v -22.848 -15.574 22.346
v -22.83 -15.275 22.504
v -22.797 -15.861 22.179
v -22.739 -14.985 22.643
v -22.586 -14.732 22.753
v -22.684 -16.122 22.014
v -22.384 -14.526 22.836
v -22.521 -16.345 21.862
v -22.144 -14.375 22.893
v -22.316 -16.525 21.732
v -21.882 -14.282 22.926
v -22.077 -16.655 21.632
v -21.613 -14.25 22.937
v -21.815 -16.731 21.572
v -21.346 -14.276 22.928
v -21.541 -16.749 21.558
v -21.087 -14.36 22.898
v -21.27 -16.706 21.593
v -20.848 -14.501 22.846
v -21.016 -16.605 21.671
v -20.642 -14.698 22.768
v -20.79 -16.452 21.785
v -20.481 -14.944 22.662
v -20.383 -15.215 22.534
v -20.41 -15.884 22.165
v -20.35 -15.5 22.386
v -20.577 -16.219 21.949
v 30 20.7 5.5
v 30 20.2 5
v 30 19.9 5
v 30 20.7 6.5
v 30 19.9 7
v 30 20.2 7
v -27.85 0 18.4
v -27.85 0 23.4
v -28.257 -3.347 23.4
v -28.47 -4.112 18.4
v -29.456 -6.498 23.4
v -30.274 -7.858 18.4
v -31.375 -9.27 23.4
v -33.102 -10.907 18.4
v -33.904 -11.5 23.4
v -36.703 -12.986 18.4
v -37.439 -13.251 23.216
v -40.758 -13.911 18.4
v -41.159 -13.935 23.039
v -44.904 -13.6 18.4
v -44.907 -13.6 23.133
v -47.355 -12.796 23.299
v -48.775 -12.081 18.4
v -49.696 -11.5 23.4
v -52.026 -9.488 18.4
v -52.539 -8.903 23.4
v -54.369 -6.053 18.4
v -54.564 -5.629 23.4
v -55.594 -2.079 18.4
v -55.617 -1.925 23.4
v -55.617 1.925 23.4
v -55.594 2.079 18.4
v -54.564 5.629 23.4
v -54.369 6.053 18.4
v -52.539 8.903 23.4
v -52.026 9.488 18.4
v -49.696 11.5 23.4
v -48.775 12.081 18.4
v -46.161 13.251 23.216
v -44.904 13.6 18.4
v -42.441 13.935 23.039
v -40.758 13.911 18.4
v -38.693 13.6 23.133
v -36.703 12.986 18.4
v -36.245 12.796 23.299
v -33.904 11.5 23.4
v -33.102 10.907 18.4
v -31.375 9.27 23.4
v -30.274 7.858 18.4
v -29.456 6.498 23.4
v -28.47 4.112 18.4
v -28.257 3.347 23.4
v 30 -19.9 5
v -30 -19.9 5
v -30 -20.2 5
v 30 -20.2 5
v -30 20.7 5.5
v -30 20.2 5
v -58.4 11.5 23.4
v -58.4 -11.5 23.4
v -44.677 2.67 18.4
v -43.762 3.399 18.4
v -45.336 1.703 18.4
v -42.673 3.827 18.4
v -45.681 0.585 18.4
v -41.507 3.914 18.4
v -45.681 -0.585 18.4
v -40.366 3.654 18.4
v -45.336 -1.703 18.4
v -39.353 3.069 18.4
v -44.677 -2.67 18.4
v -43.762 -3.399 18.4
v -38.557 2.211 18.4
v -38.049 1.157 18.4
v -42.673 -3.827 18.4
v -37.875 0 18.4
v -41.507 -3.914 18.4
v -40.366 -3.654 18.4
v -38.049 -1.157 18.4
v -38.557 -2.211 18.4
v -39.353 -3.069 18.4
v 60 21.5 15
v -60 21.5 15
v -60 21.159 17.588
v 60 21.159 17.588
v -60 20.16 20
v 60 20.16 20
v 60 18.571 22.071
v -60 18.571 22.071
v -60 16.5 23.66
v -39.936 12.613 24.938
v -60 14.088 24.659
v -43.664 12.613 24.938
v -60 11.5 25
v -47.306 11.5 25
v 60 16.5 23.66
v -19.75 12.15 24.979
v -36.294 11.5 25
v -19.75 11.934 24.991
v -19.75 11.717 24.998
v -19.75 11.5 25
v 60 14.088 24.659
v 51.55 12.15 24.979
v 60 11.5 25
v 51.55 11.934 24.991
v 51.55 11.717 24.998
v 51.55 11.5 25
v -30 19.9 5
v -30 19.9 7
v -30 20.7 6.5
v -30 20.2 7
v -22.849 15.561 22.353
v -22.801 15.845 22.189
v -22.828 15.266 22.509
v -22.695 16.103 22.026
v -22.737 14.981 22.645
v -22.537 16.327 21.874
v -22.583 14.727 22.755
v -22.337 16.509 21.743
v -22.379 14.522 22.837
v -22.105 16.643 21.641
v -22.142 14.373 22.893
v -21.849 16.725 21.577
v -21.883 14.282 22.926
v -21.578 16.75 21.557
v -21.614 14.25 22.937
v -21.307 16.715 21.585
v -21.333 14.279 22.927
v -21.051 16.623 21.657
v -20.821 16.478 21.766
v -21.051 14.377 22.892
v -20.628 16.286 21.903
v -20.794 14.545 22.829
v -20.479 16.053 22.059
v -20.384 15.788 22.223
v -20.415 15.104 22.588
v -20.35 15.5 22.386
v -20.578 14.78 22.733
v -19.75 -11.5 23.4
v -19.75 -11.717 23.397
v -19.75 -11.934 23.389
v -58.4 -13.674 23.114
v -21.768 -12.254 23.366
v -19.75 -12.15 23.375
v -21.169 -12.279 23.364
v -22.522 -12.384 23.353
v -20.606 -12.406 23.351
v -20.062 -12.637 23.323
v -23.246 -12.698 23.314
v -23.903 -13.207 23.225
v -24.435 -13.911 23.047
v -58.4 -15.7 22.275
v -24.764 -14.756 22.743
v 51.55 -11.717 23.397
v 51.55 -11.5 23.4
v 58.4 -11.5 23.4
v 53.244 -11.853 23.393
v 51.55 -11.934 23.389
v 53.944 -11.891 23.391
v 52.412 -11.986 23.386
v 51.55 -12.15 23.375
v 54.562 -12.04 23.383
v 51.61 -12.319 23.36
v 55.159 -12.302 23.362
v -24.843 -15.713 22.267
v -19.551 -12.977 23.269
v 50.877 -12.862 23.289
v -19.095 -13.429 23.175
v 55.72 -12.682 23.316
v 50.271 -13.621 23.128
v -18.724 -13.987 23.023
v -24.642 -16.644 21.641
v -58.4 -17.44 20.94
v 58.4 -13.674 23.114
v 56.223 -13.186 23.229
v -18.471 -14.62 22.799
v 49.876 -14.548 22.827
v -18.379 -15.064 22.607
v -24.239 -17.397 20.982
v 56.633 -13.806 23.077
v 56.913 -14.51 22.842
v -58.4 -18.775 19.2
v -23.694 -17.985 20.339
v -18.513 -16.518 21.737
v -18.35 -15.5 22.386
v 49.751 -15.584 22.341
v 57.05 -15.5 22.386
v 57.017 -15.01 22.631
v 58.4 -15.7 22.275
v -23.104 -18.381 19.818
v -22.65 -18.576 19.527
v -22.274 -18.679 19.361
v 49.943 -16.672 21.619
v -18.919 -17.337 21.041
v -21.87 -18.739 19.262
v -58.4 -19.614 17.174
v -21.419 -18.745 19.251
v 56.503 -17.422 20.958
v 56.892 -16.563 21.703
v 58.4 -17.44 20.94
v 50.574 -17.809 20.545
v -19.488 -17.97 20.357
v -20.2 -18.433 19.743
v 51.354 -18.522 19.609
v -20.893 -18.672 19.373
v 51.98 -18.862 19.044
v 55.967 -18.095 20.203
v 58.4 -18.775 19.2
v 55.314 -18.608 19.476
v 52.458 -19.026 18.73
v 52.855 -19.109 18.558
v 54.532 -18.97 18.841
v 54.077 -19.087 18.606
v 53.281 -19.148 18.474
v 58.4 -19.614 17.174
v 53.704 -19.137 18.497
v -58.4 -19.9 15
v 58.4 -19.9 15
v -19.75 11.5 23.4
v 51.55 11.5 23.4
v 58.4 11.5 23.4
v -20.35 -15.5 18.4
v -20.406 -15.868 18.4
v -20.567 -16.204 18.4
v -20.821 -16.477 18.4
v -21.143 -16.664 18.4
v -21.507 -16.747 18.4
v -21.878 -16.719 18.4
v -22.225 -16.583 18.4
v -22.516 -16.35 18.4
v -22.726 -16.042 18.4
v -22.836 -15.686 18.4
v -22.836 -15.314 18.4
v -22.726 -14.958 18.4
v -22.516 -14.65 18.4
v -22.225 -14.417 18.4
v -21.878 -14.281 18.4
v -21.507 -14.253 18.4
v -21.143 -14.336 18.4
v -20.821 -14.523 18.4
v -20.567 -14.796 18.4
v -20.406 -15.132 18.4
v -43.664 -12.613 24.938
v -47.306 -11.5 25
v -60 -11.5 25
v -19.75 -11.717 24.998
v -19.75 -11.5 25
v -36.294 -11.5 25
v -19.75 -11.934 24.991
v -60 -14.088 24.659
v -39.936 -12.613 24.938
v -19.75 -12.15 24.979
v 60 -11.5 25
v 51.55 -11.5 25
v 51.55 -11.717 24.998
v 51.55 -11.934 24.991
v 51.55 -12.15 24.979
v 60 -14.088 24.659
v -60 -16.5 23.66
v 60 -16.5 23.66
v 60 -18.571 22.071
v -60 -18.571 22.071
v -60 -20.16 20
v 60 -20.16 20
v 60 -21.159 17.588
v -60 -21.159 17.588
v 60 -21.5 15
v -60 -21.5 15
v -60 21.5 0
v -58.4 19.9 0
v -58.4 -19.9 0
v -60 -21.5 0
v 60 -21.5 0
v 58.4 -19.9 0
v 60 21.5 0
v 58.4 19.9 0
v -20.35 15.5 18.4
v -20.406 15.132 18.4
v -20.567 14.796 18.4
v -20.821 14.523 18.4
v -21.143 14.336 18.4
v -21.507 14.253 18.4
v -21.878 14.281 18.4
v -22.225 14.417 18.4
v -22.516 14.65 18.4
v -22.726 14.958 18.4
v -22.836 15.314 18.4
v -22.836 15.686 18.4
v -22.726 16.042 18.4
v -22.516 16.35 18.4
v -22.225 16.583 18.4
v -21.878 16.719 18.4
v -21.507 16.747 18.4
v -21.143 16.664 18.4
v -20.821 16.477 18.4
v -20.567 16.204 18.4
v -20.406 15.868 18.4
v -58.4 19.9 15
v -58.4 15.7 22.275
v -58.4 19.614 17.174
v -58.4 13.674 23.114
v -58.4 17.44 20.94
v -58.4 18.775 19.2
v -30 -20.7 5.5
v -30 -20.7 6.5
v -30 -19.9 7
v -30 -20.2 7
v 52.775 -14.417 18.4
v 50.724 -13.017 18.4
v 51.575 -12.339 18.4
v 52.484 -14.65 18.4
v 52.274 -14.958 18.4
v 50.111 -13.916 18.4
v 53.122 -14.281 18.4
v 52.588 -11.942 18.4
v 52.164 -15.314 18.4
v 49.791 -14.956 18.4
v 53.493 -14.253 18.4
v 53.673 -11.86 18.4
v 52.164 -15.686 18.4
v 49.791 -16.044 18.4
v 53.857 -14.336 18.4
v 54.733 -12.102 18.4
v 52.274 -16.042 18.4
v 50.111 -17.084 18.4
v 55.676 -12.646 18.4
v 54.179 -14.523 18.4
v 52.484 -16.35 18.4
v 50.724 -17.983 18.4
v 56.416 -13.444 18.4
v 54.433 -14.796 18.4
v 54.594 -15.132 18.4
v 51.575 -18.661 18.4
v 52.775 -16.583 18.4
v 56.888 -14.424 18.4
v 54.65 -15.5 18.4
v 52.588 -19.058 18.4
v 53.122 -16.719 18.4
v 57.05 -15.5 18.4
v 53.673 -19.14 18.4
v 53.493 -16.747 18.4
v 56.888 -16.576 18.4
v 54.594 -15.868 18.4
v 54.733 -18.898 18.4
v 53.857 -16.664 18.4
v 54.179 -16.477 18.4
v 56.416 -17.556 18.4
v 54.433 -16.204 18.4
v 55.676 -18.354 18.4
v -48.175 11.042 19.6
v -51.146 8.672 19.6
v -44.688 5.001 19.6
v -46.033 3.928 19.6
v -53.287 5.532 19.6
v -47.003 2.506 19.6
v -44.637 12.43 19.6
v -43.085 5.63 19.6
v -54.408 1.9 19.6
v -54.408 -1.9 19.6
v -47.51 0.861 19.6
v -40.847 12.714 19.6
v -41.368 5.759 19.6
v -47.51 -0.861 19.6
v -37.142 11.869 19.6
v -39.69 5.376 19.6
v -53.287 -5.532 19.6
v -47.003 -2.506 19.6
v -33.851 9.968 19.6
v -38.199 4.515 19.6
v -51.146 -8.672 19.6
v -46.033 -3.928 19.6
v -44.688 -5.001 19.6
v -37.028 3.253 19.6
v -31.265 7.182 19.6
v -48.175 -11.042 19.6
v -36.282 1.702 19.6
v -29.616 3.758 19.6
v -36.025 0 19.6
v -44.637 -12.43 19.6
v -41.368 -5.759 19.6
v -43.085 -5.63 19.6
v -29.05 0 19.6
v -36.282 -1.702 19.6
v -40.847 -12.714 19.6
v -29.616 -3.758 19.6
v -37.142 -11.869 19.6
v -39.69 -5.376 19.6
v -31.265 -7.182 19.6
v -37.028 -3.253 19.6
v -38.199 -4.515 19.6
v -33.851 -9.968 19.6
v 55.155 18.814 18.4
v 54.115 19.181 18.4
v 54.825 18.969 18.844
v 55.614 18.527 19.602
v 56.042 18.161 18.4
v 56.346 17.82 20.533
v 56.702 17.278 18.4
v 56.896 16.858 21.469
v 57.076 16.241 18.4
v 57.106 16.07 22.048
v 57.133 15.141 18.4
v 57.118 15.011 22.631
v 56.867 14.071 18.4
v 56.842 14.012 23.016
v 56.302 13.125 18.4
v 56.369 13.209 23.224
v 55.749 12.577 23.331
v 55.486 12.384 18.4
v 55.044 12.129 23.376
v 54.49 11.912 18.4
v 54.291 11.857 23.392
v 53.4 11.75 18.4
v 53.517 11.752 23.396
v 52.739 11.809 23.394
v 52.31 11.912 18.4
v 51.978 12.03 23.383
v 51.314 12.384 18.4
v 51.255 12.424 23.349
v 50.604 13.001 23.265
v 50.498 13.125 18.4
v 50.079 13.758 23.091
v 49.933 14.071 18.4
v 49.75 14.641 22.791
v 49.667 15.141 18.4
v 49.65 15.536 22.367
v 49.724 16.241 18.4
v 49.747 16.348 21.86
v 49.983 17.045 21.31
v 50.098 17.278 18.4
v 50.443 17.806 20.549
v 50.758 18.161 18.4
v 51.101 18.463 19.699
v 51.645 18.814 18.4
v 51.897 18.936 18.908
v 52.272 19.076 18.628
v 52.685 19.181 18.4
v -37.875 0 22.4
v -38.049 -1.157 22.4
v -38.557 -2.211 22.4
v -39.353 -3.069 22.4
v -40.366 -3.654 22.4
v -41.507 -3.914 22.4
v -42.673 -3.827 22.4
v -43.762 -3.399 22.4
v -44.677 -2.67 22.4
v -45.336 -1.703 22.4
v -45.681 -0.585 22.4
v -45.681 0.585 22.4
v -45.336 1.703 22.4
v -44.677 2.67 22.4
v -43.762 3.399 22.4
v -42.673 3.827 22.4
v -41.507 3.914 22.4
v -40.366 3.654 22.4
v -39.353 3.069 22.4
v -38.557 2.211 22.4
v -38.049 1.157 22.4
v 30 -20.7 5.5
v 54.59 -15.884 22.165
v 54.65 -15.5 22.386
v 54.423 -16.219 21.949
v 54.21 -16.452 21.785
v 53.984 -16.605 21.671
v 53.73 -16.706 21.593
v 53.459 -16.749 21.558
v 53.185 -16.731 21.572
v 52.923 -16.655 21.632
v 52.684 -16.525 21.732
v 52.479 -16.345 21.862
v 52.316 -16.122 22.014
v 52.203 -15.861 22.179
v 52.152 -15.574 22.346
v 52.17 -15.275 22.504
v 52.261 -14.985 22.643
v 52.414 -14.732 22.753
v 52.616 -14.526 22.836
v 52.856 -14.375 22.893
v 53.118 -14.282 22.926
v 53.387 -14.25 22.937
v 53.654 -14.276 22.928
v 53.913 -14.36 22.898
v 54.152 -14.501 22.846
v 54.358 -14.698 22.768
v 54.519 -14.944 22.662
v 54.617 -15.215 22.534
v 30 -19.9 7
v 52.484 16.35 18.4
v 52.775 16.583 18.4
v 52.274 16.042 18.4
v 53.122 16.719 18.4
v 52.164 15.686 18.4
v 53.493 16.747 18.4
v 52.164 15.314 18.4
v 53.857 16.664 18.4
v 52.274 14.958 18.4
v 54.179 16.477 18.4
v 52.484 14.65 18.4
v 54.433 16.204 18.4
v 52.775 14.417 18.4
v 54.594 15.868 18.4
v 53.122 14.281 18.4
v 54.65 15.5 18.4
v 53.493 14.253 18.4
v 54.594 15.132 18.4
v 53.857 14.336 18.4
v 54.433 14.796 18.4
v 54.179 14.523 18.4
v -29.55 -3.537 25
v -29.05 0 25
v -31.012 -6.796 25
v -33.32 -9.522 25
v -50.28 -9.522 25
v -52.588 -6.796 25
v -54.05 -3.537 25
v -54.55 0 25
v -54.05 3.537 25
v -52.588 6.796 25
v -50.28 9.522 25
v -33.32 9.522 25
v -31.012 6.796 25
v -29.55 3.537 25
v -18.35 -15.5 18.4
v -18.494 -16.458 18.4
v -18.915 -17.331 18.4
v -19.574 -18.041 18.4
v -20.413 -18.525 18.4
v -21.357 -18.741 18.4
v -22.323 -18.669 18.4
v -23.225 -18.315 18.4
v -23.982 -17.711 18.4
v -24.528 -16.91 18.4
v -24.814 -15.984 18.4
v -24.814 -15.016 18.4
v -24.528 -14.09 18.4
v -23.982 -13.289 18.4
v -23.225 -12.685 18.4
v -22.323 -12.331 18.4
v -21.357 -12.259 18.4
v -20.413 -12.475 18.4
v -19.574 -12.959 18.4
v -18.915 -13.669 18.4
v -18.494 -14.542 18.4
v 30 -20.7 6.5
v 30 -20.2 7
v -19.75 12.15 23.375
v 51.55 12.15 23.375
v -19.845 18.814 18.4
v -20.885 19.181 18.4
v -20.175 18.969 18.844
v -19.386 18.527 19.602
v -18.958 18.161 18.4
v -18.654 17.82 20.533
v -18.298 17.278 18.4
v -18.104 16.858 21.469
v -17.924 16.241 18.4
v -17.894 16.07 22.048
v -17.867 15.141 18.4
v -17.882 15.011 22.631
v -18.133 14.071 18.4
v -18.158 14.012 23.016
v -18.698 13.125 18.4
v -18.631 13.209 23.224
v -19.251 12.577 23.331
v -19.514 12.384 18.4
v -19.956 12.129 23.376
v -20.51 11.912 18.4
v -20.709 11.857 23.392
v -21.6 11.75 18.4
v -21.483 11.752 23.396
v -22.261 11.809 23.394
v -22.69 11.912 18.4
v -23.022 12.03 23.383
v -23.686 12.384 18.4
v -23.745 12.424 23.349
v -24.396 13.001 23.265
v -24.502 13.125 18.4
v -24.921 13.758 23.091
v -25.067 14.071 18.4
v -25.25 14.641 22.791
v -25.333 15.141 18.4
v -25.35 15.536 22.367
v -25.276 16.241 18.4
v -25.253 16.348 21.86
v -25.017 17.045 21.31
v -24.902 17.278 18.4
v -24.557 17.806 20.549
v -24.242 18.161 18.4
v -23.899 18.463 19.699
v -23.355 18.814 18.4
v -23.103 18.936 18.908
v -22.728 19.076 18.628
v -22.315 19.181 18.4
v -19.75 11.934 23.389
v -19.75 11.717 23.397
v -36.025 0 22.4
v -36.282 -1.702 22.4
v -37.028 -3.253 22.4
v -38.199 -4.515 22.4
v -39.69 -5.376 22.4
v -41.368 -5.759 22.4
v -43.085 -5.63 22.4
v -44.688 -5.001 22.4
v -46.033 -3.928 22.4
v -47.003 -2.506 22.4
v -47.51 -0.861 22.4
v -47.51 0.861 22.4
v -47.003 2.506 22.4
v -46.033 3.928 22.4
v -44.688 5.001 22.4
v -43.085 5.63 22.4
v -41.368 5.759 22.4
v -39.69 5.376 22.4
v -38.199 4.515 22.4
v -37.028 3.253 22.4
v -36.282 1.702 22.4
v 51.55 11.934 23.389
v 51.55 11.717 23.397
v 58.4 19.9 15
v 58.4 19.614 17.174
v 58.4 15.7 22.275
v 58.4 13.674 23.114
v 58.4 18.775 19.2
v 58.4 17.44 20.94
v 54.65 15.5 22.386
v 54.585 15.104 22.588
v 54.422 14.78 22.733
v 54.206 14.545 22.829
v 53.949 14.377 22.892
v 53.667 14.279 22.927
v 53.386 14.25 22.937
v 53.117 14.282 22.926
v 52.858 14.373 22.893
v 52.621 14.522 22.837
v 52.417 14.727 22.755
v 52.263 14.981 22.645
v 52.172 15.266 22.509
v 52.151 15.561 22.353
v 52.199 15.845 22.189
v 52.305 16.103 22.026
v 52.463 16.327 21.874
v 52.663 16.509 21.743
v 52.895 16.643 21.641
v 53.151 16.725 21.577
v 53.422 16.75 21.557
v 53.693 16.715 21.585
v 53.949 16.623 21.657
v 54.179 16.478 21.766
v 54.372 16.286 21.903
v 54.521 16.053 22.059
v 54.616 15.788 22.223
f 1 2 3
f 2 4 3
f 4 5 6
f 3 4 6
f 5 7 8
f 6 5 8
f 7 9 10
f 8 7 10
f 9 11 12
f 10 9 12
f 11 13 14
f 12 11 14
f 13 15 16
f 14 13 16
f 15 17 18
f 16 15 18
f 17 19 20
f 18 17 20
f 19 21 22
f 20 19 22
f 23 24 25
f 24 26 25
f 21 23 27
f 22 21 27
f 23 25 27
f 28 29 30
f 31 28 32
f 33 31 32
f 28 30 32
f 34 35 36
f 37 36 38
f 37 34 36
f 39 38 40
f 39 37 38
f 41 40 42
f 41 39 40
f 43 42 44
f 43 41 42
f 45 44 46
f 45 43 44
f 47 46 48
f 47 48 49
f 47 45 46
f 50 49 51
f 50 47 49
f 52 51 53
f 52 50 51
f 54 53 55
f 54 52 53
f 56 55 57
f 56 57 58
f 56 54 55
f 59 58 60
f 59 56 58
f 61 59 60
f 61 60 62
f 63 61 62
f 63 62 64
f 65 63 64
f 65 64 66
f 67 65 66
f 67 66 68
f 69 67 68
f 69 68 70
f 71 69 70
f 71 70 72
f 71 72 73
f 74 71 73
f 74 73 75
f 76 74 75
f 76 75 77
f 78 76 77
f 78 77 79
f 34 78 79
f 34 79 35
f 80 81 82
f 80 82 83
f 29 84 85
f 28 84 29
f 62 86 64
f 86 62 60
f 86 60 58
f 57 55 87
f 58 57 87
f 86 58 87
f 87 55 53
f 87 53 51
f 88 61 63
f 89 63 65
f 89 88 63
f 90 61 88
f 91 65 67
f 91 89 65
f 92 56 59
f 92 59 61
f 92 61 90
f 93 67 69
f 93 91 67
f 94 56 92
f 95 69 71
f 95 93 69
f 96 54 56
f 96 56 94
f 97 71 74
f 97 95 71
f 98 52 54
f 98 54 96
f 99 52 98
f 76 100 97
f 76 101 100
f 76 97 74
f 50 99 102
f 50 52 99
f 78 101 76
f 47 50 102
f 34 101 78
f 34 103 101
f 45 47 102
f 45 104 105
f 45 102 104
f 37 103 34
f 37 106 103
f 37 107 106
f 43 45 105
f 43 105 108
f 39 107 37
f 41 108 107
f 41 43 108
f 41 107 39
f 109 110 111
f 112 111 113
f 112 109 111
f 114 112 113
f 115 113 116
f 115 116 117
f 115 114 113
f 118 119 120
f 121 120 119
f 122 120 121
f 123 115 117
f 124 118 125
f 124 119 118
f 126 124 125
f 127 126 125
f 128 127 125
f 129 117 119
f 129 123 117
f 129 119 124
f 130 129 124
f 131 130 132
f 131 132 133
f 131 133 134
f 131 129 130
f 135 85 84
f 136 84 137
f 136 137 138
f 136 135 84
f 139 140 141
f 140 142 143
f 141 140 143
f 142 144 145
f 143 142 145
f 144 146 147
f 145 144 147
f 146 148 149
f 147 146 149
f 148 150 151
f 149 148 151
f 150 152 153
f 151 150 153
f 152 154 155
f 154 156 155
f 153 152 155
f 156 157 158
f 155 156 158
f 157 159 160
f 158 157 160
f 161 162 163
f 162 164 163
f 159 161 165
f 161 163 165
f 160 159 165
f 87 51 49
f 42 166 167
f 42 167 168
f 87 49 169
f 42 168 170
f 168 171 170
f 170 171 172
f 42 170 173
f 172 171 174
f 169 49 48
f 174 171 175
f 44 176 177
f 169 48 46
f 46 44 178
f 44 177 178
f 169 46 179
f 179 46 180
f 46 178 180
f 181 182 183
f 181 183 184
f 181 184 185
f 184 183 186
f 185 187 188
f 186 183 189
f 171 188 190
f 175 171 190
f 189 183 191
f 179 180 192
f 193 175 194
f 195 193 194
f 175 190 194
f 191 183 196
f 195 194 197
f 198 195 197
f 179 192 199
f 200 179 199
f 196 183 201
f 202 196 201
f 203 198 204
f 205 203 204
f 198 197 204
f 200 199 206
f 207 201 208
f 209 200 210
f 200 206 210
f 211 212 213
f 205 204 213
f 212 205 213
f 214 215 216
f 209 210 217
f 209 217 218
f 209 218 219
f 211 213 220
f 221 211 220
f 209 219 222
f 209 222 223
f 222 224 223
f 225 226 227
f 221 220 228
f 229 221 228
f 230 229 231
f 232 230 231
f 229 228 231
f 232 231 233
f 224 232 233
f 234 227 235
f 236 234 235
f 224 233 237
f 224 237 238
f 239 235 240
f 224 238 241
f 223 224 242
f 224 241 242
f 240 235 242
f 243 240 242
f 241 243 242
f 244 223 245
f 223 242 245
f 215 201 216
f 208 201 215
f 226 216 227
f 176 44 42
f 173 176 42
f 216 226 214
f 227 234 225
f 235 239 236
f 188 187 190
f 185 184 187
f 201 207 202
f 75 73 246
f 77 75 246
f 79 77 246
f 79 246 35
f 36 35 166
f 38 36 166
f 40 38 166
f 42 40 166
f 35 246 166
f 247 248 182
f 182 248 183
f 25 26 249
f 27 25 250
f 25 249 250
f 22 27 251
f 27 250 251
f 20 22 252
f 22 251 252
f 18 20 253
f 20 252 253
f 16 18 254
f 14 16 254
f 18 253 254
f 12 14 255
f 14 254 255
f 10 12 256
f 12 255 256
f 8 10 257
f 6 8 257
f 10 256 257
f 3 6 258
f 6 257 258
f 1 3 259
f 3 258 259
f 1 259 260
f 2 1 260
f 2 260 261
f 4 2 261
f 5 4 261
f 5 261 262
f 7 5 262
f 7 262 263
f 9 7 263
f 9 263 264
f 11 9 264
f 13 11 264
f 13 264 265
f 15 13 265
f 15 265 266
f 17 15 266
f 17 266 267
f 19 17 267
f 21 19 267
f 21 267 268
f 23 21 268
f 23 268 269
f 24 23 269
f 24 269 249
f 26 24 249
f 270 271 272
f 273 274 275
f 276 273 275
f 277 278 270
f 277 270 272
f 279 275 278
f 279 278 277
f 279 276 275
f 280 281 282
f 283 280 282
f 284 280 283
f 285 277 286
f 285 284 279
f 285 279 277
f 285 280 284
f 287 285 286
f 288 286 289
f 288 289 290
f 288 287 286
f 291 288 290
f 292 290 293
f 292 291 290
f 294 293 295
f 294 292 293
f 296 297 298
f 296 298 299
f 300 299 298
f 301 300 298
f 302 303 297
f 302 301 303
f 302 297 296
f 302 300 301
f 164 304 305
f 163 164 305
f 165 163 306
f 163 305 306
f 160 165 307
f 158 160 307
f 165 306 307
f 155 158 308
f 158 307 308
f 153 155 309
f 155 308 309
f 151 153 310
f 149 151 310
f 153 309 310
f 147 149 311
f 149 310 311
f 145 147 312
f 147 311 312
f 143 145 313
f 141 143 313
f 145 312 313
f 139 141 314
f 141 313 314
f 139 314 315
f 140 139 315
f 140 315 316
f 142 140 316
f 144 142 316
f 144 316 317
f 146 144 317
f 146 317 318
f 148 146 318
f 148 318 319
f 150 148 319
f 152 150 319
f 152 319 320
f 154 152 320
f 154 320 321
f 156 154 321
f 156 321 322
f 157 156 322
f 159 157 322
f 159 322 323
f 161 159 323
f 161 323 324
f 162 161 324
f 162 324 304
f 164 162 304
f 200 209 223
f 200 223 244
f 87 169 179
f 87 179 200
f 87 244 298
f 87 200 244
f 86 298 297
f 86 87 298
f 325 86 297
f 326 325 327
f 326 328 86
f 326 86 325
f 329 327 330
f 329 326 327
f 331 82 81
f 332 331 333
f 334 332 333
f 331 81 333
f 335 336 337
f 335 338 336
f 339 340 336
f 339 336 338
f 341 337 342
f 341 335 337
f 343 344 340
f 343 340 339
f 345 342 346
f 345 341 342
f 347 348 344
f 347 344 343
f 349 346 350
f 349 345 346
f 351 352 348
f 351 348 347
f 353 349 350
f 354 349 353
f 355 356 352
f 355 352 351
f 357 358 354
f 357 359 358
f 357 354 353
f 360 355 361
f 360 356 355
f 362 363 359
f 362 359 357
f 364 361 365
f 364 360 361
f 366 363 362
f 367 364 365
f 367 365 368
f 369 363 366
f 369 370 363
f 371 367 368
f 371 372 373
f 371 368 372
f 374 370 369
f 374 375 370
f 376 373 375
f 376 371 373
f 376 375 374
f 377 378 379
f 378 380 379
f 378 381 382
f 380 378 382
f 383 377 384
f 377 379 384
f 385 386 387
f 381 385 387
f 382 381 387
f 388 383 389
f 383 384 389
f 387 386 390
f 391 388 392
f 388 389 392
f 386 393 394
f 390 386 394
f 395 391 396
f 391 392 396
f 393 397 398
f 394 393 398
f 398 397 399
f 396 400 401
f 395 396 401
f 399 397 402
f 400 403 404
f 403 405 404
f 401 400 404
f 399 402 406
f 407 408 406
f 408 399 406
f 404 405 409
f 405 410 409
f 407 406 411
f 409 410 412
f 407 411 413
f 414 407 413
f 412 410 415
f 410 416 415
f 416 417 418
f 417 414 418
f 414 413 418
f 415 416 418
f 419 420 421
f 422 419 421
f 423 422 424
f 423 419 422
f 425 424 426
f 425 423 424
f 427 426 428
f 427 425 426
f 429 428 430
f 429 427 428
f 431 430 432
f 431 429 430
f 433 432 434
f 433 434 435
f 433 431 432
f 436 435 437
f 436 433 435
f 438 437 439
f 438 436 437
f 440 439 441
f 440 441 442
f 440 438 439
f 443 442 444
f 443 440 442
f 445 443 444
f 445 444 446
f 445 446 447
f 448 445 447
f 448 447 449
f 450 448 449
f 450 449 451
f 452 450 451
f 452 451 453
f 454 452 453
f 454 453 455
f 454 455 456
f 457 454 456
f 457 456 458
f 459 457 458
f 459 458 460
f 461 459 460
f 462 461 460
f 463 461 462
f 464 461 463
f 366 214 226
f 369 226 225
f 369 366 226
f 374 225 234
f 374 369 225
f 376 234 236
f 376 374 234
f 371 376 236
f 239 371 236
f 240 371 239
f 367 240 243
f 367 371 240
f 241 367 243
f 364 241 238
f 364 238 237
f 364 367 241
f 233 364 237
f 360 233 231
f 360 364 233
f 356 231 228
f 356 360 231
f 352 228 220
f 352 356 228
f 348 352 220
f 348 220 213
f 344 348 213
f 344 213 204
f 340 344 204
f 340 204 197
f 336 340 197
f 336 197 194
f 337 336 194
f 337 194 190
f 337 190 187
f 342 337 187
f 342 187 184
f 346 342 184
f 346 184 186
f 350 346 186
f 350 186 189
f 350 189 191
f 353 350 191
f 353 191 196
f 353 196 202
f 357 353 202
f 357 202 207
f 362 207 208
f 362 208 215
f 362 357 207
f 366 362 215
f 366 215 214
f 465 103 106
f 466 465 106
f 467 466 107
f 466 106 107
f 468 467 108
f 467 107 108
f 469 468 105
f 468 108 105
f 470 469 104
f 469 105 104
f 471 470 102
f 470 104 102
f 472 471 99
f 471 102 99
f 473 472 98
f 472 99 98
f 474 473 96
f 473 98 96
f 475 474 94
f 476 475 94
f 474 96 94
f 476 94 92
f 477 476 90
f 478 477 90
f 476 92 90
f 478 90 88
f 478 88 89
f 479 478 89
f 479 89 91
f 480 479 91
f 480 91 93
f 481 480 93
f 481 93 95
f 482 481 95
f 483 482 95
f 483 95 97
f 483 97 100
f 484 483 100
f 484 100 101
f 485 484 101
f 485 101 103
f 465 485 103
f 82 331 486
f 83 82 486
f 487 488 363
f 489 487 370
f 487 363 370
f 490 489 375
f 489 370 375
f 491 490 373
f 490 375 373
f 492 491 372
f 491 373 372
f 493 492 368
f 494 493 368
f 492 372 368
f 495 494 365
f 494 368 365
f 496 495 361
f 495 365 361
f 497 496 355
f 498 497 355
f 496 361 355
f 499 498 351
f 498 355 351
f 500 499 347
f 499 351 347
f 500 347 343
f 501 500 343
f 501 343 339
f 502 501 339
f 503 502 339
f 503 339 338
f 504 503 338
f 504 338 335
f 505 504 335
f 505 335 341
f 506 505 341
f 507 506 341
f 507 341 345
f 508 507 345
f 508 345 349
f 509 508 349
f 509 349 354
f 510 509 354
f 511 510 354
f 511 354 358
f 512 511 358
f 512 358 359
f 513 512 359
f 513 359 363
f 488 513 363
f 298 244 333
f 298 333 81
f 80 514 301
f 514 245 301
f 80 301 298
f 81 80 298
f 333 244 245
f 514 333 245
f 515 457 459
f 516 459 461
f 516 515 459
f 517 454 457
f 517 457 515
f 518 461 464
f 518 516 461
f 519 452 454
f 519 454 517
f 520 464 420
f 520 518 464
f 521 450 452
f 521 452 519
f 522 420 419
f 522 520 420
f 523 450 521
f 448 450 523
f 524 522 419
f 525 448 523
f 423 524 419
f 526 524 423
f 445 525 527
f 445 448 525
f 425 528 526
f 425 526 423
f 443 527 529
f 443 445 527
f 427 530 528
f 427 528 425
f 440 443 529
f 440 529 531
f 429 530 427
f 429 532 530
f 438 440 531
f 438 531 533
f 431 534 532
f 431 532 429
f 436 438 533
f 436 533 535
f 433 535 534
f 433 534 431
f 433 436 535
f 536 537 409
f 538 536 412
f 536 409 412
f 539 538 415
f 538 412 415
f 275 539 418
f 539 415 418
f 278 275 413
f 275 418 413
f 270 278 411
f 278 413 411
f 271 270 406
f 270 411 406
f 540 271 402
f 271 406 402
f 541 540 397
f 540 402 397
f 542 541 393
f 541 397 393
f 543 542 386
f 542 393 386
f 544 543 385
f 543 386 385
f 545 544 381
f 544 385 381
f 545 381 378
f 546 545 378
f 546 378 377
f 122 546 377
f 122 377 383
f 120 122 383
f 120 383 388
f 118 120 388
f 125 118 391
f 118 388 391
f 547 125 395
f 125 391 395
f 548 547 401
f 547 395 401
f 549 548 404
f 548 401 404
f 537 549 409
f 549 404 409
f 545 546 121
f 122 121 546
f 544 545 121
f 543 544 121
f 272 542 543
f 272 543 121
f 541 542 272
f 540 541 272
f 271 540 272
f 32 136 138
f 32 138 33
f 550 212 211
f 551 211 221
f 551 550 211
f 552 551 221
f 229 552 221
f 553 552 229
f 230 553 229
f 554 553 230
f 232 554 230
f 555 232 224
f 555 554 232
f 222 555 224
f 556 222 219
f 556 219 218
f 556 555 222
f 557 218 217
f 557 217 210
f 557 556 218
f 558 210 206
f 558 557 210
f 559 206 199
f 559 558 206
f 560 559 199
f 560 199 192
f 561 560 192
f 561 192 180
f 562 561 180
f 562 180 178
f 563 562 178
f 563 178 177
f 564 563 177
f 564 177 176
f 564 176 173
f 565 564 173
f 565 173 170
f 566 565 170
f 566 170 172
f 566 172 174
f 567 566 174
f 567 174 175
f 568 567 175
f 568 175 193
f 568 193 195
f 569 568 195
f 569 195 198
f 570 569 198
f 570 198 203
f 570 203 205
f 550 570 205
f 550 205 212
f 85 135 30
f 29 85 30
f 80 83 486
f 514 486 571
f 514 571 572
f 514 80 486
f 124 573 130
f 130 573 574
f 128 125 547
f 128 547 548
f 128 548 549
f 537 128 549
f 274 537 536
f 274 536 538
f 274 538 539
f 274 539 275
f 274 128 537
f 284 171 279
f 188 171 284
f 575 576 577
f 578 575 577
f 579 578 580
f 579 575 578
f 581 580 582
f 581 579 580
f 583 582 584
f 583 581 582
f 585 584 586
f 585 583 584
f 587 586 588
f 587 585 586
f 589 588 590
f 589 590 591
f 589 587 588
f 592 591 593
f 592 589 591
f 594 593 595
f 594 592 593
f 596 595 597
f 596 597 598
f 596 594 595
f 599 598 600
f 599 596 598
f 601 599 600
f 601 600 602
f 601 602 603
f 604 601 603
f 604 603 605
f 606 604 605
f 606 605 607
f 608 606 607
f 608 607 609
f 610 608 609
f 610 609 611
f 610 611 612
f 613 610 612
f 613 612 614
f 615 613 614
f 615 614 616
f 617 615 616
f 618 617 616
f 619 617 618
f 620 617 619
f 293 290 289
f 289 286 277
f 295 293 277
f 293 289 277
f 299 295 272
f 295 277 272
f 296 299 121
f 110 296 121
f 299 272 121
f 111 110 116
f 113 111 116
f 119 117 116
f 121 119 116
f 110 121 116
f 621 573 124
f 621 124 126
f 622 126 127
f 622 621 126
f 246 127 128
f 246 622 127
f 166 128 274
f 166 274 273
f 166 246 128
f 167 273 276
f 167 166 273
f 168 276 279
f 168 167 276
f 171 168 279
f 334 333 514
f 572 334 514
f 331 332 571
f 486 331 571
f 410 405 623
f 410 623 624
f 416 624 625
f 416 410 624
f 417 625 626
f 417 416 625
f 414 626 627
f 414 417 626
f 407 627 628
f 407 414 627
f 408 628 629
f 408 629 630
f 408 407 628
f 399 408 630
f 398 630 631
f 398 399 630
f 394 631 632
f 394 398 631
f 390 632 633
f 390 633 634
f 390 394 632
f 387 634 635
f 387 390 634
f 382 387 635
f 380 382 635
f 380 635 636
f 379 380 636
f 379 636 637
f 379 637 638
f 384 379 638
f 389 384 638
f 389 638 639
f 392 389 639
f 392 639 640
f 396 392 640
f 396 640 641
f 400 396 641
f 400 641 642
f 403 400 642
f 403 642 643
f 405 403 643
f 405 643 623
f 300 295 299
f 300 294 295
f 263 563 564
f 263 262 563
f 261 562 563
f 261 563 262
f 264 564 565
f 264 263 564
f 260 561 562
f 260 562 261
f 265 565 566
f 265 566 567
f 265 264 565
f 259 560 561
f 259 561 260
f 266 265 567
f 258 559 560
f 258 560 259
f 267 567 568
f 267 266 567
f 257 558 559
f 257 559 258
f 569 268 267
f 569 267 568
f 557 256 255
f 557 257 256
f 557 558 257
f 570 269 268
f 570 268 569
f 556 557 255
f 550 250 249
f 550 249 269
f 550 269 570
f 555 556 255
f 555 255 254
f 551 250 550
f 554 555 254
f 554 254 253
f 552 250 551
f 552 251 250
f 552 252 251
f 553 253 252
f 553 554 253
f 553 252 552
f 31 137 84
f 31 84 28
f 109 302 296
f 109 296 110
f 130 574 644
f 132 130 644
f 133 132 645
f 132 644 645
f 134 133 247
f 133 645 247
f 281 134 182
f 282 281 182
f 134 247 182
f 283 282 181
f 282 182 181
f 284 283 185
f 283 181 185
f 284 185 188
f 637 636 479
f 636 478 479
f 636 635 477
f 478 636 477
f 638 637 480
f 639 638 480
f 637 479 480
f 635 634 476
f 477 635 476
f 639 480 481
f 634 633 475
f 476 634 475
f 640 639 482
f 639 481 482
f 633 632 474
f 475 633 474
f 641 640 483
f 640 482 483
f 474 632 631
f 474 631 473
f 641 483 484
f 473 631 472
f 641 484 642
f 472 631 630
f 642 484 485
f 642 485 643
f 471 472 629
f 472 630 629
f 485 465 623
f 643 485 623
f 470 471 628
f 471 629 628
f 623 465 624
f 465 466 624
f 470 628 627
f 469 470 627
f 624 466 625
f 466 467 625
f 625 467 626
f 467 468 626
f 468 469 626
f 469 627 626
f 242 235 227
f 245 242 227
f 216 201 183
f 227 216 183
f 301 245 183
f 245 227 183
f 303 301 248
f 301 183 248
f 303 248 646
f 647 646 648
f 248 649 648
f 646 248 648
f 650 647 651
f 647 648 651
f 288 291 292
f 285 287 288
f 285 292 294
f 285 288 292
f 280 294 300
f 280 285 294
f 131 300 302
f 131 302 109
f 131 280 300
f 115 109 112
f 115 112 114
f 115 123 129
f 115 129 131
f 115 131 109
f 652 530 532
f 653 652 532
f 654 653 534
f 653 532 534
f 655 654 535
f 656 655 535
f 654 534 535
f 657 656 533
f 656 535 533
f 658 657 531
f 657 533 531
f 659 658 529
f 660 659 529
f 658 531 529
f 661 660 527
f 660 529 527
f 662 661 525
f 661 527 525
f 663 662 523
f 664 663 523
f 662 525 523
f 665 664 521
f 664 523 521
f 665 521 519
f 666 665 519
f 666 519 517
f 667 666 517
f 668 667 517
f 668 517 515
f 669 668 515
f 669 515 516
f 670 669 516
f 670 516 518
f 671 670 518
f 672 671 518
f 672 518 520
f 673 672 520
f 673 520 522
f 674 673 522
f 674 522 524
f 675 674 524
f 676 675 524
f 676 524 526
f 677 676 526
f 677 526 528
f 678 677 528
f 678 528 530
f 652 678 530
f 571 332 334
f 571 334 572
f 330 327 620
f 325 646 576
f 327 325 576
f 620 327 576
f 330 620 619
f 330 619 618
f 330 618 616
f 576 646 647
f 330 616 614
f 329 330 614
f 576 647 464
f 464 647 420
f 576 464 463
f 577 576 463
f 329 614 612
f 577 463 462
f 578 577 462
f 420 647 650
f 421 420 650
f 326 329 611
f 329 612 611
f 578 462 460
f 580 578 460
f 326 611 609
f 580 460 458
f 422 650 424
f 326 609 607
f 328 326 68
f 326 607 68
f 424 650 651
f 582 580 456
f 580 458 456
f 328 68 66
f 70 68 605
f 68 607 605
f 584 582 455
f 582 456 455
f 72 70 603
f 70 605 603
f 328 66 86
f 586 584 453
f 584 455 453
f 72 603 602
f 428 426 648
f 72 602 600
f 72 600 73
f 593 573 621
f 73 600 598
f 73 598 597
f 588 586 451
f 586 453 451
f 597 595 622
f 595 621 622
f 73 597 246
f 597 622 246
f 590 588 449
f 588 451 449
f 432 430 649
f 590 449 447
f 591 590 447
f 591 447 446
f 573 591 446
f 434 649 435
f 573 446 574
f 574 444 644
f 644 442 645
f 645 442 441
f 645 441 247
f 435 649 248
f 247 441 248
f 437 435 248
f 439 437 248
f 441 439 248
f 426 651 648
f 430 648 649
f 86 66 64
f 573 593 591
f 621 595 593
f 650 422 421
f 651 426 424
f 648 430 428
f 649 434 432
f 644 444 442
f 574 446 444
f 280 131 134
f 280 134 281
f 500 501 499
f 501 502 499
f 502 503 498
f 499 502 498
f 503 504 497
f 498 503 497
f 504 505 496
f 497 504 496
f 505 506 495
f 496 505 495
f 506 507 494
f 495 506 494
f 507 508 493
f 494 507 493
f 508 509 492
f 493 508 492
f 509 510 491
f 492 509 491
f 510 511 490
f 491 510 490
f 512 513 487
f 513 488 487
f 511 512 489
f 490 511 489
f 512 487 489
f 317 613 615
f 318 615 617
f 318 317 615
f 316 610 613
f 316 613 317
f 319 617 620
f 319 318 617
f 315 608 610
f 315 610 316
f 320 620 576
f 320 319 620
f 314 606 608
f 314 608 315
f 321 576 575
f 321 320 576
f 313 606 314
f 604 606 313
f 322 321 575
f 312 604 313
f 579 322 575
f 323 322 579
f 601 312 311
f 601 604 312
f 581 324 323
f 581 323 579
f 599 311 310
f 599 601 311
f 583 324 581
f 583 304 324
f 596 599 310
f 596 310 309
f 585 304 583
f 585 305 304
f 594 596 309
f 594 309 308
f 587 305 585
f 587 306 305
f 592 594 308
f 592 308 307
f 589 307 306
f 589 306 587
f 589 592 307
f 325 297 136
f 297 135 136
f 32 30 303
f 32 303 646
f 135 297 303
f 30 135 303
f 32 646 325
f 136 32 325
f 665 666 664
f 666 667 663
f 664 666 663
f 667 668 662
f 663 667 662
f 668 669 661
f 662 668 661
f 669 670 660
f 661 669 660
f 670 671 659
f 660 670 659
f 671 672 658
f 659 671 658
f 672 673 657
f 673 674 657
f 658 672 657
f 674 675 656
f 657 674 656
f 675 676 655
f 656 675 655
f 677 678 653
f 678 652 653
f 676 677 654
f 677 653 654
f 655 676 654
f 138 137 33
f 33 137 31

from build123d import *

# Parameters (mm, degrees)
F1_DEPTH  = 60
F2_T      = -1.6
F4_R      = 3.75
F4_R_2    = 1.25
F4_R_3    = 3.65
F4_R_4    = 3.25
F4_R_5    = 12.75
F4_W      = 71.3
F4_H      = 24.3
F6_DEPTH  = 6.601
F4_R_6    = 13.95
F7_DEPTH  = 1.2
F8_R      = 3.925
F9_DEPTH  = 6.6010001
F8_R_2    = 5.775
F10_DEPTH = 4
F11_DEPTH = 5
F12_W     = 60
F12_H     = 2
F13_DEPTH = 0.8
F14_SIZE  = 0.5


with BuildPart() as f1:
    # F0 (on Right) → F1 (new body, symmetric)
    with BuildSketch(Plane.YZ):
        with BuildLine():
            Line((-21.5, 15), (-21.5, 0))
            Line((-21.5, 0), (21.5, 0))
            Line((21.5, 0), (21.5, 15))
            ThreePointArc((21.5, 15), (18.5710678119, 22.0710678119), (11.5, 25))
            Line((11.5, 25), (-11.5, 25))
            ThreePointArc((-11.5, 25), (-18.5710678119, 22.0710678119), (-21.5, 15))
        make_face()
    extrude(amount=F1_DEPTH, both=True)

    # F2
    f2_openings = [f1.faces().sort_by_distance(p)[0] for p in [
        (0, 0, 0),
    ]]
    offset(amount=F2_T, openings=f2_openings)

    # F4 (on offset) → F5 (join, up to the next surface of F1)
    with BuildSketch(Plane(origin=(0, 0, 18.4), x_dir=(1, 0, 0), z_dir=(0, 0, -1))):
        with Locations((53.4, -15.5)):
            Circle(F4_R)
        with Locations((53.4, -15.5)):
            Circle(F4_R_2, mode=Mode.SUBTRACT)
        with Locations((53.4, 15.5)):
            Circle(F4_R_3)
        with Locations((53.4, 15.5)):
            Circle(F4_R_2, mode=Mode.SUBTRACT)
        with Locations((-21.6, -15.5)):
            Circle(F4_R)
        with Locations((-21.6, -15.5)):
            Circle(F4_R_2, mode=Mode.SUBTRACT)
        with Locations((-21.6, 15.5)):
            Circle(F4_R_4)
        with Locations((-21.6, 15.5)):
            Circle(F4_R_2, mode=Mode.SUBTRACT)
    extrude(until=Until.NEXT, dir=(0, 0, 1))

    # F4 (on offset) → F6 (cut, through all)
    with BuildSketch(Plane(origin=(0, 0, 18.4), x_dir=(1, 0, 0), z_dir=(0, 0, -1))):
        with Locations((-41.8, 0)):
            Circle(F4_R_5)
        with Locations((15.9, 0)):
            Rectangle(F4_W, F4_H)
    extrude(amount=-F6_DEPTH, mode=Mode.SUBTRACT)



with BuildPart() as f7:
    # F4 (on offset) → F7 (new body)
    with BuildSketch(Plane(origin=(0, 0, 18.4), x_dir=(1, 0, 0), z_dir=(0, 0, -1))):
        with Locations((-41.8, 0)):
            Circle(F4_R_6)
        with Locations((-41.8, 0)):
            Circle(F4_R_5, mode=Mode.SUBTRACT)
        with Locations((-41.8, 0)):
            Circle(F4_R_5)
    extrude(amount=-F7_DEPTH)

    # F8 (on face) → F9 (cut, through all)
    with BuildSketch(Plane(origin=(0, 0, 18.4), x_dir=(1, 0, 0), z_dir=(0, 0, -1))):
        with Locations((-41.8, 0)):
            Circle(F8_R)
    extrude(amount=-F9_DEPTH, mode=Mode.SUBTRACT)

    # F8 (on face) → F10 (join)
    with BuildSketch(Plane(origin=(0, 0, 18.4), x_dir=(1, 0, 0), z_dir=(0, 0, -1))):
        with Locations((-41.8, 0)):
            Circle(F8_R_2)
        with Locations((-41.8, 0)):
            Circle(F8_R, mode=Mode.SUBTRACT)
    extrude(amount=-F10_DEPTH)


with BuildPart() as f1_1:
    add(f1.part)

    add(f7.part)  # F11 merges F7
    # F4 (on offset) → F11 (join, through all)
    with BuildSketch(Plane(origin=(0, 0, 18.4), x_dir=(1, 0, 0), z_dir=(0, 0, -1))):
        with Locations((-41.8, 0)):
            Circle(F4_R_6)
        with Locations((-41.8, 0)):
            Circle(F4_R_5, mode=Mode.SUBTRACT)
    extrude(amount=-F11_DEPTH)


with BuildPart() as f13:
    # F12 (on face) → F13 (new body)
    with BuildSketch(Plane.XZ.offset(-19.9)):
        with Locations((0, 6)):
            Rectangle(F12_W, F12_H)
    extrude(amount=-F13_DEPTH)

    # F14
    f14_edges = [f13.edges().sort_by_distance(p)[0] for p in [
        (0, 20.7, 5),
        (0, 20.7, 7),
    ]]
    chamfer(f14_edges, length=F14_SIZE)


with BuildPart() as f15_1:
    # F15: instance of F13
    add(f13.part.mirror(Plane.XZ))


with BuildPart() as f1_2:
    add(f1_1.part)

    # F16: cut F13, F15_1
    add(f13.part, mode=Mode.SUBTRACT)
    add(f15_1.part, mode=Mode.SUBTRACT)


solid = f1_2.part
